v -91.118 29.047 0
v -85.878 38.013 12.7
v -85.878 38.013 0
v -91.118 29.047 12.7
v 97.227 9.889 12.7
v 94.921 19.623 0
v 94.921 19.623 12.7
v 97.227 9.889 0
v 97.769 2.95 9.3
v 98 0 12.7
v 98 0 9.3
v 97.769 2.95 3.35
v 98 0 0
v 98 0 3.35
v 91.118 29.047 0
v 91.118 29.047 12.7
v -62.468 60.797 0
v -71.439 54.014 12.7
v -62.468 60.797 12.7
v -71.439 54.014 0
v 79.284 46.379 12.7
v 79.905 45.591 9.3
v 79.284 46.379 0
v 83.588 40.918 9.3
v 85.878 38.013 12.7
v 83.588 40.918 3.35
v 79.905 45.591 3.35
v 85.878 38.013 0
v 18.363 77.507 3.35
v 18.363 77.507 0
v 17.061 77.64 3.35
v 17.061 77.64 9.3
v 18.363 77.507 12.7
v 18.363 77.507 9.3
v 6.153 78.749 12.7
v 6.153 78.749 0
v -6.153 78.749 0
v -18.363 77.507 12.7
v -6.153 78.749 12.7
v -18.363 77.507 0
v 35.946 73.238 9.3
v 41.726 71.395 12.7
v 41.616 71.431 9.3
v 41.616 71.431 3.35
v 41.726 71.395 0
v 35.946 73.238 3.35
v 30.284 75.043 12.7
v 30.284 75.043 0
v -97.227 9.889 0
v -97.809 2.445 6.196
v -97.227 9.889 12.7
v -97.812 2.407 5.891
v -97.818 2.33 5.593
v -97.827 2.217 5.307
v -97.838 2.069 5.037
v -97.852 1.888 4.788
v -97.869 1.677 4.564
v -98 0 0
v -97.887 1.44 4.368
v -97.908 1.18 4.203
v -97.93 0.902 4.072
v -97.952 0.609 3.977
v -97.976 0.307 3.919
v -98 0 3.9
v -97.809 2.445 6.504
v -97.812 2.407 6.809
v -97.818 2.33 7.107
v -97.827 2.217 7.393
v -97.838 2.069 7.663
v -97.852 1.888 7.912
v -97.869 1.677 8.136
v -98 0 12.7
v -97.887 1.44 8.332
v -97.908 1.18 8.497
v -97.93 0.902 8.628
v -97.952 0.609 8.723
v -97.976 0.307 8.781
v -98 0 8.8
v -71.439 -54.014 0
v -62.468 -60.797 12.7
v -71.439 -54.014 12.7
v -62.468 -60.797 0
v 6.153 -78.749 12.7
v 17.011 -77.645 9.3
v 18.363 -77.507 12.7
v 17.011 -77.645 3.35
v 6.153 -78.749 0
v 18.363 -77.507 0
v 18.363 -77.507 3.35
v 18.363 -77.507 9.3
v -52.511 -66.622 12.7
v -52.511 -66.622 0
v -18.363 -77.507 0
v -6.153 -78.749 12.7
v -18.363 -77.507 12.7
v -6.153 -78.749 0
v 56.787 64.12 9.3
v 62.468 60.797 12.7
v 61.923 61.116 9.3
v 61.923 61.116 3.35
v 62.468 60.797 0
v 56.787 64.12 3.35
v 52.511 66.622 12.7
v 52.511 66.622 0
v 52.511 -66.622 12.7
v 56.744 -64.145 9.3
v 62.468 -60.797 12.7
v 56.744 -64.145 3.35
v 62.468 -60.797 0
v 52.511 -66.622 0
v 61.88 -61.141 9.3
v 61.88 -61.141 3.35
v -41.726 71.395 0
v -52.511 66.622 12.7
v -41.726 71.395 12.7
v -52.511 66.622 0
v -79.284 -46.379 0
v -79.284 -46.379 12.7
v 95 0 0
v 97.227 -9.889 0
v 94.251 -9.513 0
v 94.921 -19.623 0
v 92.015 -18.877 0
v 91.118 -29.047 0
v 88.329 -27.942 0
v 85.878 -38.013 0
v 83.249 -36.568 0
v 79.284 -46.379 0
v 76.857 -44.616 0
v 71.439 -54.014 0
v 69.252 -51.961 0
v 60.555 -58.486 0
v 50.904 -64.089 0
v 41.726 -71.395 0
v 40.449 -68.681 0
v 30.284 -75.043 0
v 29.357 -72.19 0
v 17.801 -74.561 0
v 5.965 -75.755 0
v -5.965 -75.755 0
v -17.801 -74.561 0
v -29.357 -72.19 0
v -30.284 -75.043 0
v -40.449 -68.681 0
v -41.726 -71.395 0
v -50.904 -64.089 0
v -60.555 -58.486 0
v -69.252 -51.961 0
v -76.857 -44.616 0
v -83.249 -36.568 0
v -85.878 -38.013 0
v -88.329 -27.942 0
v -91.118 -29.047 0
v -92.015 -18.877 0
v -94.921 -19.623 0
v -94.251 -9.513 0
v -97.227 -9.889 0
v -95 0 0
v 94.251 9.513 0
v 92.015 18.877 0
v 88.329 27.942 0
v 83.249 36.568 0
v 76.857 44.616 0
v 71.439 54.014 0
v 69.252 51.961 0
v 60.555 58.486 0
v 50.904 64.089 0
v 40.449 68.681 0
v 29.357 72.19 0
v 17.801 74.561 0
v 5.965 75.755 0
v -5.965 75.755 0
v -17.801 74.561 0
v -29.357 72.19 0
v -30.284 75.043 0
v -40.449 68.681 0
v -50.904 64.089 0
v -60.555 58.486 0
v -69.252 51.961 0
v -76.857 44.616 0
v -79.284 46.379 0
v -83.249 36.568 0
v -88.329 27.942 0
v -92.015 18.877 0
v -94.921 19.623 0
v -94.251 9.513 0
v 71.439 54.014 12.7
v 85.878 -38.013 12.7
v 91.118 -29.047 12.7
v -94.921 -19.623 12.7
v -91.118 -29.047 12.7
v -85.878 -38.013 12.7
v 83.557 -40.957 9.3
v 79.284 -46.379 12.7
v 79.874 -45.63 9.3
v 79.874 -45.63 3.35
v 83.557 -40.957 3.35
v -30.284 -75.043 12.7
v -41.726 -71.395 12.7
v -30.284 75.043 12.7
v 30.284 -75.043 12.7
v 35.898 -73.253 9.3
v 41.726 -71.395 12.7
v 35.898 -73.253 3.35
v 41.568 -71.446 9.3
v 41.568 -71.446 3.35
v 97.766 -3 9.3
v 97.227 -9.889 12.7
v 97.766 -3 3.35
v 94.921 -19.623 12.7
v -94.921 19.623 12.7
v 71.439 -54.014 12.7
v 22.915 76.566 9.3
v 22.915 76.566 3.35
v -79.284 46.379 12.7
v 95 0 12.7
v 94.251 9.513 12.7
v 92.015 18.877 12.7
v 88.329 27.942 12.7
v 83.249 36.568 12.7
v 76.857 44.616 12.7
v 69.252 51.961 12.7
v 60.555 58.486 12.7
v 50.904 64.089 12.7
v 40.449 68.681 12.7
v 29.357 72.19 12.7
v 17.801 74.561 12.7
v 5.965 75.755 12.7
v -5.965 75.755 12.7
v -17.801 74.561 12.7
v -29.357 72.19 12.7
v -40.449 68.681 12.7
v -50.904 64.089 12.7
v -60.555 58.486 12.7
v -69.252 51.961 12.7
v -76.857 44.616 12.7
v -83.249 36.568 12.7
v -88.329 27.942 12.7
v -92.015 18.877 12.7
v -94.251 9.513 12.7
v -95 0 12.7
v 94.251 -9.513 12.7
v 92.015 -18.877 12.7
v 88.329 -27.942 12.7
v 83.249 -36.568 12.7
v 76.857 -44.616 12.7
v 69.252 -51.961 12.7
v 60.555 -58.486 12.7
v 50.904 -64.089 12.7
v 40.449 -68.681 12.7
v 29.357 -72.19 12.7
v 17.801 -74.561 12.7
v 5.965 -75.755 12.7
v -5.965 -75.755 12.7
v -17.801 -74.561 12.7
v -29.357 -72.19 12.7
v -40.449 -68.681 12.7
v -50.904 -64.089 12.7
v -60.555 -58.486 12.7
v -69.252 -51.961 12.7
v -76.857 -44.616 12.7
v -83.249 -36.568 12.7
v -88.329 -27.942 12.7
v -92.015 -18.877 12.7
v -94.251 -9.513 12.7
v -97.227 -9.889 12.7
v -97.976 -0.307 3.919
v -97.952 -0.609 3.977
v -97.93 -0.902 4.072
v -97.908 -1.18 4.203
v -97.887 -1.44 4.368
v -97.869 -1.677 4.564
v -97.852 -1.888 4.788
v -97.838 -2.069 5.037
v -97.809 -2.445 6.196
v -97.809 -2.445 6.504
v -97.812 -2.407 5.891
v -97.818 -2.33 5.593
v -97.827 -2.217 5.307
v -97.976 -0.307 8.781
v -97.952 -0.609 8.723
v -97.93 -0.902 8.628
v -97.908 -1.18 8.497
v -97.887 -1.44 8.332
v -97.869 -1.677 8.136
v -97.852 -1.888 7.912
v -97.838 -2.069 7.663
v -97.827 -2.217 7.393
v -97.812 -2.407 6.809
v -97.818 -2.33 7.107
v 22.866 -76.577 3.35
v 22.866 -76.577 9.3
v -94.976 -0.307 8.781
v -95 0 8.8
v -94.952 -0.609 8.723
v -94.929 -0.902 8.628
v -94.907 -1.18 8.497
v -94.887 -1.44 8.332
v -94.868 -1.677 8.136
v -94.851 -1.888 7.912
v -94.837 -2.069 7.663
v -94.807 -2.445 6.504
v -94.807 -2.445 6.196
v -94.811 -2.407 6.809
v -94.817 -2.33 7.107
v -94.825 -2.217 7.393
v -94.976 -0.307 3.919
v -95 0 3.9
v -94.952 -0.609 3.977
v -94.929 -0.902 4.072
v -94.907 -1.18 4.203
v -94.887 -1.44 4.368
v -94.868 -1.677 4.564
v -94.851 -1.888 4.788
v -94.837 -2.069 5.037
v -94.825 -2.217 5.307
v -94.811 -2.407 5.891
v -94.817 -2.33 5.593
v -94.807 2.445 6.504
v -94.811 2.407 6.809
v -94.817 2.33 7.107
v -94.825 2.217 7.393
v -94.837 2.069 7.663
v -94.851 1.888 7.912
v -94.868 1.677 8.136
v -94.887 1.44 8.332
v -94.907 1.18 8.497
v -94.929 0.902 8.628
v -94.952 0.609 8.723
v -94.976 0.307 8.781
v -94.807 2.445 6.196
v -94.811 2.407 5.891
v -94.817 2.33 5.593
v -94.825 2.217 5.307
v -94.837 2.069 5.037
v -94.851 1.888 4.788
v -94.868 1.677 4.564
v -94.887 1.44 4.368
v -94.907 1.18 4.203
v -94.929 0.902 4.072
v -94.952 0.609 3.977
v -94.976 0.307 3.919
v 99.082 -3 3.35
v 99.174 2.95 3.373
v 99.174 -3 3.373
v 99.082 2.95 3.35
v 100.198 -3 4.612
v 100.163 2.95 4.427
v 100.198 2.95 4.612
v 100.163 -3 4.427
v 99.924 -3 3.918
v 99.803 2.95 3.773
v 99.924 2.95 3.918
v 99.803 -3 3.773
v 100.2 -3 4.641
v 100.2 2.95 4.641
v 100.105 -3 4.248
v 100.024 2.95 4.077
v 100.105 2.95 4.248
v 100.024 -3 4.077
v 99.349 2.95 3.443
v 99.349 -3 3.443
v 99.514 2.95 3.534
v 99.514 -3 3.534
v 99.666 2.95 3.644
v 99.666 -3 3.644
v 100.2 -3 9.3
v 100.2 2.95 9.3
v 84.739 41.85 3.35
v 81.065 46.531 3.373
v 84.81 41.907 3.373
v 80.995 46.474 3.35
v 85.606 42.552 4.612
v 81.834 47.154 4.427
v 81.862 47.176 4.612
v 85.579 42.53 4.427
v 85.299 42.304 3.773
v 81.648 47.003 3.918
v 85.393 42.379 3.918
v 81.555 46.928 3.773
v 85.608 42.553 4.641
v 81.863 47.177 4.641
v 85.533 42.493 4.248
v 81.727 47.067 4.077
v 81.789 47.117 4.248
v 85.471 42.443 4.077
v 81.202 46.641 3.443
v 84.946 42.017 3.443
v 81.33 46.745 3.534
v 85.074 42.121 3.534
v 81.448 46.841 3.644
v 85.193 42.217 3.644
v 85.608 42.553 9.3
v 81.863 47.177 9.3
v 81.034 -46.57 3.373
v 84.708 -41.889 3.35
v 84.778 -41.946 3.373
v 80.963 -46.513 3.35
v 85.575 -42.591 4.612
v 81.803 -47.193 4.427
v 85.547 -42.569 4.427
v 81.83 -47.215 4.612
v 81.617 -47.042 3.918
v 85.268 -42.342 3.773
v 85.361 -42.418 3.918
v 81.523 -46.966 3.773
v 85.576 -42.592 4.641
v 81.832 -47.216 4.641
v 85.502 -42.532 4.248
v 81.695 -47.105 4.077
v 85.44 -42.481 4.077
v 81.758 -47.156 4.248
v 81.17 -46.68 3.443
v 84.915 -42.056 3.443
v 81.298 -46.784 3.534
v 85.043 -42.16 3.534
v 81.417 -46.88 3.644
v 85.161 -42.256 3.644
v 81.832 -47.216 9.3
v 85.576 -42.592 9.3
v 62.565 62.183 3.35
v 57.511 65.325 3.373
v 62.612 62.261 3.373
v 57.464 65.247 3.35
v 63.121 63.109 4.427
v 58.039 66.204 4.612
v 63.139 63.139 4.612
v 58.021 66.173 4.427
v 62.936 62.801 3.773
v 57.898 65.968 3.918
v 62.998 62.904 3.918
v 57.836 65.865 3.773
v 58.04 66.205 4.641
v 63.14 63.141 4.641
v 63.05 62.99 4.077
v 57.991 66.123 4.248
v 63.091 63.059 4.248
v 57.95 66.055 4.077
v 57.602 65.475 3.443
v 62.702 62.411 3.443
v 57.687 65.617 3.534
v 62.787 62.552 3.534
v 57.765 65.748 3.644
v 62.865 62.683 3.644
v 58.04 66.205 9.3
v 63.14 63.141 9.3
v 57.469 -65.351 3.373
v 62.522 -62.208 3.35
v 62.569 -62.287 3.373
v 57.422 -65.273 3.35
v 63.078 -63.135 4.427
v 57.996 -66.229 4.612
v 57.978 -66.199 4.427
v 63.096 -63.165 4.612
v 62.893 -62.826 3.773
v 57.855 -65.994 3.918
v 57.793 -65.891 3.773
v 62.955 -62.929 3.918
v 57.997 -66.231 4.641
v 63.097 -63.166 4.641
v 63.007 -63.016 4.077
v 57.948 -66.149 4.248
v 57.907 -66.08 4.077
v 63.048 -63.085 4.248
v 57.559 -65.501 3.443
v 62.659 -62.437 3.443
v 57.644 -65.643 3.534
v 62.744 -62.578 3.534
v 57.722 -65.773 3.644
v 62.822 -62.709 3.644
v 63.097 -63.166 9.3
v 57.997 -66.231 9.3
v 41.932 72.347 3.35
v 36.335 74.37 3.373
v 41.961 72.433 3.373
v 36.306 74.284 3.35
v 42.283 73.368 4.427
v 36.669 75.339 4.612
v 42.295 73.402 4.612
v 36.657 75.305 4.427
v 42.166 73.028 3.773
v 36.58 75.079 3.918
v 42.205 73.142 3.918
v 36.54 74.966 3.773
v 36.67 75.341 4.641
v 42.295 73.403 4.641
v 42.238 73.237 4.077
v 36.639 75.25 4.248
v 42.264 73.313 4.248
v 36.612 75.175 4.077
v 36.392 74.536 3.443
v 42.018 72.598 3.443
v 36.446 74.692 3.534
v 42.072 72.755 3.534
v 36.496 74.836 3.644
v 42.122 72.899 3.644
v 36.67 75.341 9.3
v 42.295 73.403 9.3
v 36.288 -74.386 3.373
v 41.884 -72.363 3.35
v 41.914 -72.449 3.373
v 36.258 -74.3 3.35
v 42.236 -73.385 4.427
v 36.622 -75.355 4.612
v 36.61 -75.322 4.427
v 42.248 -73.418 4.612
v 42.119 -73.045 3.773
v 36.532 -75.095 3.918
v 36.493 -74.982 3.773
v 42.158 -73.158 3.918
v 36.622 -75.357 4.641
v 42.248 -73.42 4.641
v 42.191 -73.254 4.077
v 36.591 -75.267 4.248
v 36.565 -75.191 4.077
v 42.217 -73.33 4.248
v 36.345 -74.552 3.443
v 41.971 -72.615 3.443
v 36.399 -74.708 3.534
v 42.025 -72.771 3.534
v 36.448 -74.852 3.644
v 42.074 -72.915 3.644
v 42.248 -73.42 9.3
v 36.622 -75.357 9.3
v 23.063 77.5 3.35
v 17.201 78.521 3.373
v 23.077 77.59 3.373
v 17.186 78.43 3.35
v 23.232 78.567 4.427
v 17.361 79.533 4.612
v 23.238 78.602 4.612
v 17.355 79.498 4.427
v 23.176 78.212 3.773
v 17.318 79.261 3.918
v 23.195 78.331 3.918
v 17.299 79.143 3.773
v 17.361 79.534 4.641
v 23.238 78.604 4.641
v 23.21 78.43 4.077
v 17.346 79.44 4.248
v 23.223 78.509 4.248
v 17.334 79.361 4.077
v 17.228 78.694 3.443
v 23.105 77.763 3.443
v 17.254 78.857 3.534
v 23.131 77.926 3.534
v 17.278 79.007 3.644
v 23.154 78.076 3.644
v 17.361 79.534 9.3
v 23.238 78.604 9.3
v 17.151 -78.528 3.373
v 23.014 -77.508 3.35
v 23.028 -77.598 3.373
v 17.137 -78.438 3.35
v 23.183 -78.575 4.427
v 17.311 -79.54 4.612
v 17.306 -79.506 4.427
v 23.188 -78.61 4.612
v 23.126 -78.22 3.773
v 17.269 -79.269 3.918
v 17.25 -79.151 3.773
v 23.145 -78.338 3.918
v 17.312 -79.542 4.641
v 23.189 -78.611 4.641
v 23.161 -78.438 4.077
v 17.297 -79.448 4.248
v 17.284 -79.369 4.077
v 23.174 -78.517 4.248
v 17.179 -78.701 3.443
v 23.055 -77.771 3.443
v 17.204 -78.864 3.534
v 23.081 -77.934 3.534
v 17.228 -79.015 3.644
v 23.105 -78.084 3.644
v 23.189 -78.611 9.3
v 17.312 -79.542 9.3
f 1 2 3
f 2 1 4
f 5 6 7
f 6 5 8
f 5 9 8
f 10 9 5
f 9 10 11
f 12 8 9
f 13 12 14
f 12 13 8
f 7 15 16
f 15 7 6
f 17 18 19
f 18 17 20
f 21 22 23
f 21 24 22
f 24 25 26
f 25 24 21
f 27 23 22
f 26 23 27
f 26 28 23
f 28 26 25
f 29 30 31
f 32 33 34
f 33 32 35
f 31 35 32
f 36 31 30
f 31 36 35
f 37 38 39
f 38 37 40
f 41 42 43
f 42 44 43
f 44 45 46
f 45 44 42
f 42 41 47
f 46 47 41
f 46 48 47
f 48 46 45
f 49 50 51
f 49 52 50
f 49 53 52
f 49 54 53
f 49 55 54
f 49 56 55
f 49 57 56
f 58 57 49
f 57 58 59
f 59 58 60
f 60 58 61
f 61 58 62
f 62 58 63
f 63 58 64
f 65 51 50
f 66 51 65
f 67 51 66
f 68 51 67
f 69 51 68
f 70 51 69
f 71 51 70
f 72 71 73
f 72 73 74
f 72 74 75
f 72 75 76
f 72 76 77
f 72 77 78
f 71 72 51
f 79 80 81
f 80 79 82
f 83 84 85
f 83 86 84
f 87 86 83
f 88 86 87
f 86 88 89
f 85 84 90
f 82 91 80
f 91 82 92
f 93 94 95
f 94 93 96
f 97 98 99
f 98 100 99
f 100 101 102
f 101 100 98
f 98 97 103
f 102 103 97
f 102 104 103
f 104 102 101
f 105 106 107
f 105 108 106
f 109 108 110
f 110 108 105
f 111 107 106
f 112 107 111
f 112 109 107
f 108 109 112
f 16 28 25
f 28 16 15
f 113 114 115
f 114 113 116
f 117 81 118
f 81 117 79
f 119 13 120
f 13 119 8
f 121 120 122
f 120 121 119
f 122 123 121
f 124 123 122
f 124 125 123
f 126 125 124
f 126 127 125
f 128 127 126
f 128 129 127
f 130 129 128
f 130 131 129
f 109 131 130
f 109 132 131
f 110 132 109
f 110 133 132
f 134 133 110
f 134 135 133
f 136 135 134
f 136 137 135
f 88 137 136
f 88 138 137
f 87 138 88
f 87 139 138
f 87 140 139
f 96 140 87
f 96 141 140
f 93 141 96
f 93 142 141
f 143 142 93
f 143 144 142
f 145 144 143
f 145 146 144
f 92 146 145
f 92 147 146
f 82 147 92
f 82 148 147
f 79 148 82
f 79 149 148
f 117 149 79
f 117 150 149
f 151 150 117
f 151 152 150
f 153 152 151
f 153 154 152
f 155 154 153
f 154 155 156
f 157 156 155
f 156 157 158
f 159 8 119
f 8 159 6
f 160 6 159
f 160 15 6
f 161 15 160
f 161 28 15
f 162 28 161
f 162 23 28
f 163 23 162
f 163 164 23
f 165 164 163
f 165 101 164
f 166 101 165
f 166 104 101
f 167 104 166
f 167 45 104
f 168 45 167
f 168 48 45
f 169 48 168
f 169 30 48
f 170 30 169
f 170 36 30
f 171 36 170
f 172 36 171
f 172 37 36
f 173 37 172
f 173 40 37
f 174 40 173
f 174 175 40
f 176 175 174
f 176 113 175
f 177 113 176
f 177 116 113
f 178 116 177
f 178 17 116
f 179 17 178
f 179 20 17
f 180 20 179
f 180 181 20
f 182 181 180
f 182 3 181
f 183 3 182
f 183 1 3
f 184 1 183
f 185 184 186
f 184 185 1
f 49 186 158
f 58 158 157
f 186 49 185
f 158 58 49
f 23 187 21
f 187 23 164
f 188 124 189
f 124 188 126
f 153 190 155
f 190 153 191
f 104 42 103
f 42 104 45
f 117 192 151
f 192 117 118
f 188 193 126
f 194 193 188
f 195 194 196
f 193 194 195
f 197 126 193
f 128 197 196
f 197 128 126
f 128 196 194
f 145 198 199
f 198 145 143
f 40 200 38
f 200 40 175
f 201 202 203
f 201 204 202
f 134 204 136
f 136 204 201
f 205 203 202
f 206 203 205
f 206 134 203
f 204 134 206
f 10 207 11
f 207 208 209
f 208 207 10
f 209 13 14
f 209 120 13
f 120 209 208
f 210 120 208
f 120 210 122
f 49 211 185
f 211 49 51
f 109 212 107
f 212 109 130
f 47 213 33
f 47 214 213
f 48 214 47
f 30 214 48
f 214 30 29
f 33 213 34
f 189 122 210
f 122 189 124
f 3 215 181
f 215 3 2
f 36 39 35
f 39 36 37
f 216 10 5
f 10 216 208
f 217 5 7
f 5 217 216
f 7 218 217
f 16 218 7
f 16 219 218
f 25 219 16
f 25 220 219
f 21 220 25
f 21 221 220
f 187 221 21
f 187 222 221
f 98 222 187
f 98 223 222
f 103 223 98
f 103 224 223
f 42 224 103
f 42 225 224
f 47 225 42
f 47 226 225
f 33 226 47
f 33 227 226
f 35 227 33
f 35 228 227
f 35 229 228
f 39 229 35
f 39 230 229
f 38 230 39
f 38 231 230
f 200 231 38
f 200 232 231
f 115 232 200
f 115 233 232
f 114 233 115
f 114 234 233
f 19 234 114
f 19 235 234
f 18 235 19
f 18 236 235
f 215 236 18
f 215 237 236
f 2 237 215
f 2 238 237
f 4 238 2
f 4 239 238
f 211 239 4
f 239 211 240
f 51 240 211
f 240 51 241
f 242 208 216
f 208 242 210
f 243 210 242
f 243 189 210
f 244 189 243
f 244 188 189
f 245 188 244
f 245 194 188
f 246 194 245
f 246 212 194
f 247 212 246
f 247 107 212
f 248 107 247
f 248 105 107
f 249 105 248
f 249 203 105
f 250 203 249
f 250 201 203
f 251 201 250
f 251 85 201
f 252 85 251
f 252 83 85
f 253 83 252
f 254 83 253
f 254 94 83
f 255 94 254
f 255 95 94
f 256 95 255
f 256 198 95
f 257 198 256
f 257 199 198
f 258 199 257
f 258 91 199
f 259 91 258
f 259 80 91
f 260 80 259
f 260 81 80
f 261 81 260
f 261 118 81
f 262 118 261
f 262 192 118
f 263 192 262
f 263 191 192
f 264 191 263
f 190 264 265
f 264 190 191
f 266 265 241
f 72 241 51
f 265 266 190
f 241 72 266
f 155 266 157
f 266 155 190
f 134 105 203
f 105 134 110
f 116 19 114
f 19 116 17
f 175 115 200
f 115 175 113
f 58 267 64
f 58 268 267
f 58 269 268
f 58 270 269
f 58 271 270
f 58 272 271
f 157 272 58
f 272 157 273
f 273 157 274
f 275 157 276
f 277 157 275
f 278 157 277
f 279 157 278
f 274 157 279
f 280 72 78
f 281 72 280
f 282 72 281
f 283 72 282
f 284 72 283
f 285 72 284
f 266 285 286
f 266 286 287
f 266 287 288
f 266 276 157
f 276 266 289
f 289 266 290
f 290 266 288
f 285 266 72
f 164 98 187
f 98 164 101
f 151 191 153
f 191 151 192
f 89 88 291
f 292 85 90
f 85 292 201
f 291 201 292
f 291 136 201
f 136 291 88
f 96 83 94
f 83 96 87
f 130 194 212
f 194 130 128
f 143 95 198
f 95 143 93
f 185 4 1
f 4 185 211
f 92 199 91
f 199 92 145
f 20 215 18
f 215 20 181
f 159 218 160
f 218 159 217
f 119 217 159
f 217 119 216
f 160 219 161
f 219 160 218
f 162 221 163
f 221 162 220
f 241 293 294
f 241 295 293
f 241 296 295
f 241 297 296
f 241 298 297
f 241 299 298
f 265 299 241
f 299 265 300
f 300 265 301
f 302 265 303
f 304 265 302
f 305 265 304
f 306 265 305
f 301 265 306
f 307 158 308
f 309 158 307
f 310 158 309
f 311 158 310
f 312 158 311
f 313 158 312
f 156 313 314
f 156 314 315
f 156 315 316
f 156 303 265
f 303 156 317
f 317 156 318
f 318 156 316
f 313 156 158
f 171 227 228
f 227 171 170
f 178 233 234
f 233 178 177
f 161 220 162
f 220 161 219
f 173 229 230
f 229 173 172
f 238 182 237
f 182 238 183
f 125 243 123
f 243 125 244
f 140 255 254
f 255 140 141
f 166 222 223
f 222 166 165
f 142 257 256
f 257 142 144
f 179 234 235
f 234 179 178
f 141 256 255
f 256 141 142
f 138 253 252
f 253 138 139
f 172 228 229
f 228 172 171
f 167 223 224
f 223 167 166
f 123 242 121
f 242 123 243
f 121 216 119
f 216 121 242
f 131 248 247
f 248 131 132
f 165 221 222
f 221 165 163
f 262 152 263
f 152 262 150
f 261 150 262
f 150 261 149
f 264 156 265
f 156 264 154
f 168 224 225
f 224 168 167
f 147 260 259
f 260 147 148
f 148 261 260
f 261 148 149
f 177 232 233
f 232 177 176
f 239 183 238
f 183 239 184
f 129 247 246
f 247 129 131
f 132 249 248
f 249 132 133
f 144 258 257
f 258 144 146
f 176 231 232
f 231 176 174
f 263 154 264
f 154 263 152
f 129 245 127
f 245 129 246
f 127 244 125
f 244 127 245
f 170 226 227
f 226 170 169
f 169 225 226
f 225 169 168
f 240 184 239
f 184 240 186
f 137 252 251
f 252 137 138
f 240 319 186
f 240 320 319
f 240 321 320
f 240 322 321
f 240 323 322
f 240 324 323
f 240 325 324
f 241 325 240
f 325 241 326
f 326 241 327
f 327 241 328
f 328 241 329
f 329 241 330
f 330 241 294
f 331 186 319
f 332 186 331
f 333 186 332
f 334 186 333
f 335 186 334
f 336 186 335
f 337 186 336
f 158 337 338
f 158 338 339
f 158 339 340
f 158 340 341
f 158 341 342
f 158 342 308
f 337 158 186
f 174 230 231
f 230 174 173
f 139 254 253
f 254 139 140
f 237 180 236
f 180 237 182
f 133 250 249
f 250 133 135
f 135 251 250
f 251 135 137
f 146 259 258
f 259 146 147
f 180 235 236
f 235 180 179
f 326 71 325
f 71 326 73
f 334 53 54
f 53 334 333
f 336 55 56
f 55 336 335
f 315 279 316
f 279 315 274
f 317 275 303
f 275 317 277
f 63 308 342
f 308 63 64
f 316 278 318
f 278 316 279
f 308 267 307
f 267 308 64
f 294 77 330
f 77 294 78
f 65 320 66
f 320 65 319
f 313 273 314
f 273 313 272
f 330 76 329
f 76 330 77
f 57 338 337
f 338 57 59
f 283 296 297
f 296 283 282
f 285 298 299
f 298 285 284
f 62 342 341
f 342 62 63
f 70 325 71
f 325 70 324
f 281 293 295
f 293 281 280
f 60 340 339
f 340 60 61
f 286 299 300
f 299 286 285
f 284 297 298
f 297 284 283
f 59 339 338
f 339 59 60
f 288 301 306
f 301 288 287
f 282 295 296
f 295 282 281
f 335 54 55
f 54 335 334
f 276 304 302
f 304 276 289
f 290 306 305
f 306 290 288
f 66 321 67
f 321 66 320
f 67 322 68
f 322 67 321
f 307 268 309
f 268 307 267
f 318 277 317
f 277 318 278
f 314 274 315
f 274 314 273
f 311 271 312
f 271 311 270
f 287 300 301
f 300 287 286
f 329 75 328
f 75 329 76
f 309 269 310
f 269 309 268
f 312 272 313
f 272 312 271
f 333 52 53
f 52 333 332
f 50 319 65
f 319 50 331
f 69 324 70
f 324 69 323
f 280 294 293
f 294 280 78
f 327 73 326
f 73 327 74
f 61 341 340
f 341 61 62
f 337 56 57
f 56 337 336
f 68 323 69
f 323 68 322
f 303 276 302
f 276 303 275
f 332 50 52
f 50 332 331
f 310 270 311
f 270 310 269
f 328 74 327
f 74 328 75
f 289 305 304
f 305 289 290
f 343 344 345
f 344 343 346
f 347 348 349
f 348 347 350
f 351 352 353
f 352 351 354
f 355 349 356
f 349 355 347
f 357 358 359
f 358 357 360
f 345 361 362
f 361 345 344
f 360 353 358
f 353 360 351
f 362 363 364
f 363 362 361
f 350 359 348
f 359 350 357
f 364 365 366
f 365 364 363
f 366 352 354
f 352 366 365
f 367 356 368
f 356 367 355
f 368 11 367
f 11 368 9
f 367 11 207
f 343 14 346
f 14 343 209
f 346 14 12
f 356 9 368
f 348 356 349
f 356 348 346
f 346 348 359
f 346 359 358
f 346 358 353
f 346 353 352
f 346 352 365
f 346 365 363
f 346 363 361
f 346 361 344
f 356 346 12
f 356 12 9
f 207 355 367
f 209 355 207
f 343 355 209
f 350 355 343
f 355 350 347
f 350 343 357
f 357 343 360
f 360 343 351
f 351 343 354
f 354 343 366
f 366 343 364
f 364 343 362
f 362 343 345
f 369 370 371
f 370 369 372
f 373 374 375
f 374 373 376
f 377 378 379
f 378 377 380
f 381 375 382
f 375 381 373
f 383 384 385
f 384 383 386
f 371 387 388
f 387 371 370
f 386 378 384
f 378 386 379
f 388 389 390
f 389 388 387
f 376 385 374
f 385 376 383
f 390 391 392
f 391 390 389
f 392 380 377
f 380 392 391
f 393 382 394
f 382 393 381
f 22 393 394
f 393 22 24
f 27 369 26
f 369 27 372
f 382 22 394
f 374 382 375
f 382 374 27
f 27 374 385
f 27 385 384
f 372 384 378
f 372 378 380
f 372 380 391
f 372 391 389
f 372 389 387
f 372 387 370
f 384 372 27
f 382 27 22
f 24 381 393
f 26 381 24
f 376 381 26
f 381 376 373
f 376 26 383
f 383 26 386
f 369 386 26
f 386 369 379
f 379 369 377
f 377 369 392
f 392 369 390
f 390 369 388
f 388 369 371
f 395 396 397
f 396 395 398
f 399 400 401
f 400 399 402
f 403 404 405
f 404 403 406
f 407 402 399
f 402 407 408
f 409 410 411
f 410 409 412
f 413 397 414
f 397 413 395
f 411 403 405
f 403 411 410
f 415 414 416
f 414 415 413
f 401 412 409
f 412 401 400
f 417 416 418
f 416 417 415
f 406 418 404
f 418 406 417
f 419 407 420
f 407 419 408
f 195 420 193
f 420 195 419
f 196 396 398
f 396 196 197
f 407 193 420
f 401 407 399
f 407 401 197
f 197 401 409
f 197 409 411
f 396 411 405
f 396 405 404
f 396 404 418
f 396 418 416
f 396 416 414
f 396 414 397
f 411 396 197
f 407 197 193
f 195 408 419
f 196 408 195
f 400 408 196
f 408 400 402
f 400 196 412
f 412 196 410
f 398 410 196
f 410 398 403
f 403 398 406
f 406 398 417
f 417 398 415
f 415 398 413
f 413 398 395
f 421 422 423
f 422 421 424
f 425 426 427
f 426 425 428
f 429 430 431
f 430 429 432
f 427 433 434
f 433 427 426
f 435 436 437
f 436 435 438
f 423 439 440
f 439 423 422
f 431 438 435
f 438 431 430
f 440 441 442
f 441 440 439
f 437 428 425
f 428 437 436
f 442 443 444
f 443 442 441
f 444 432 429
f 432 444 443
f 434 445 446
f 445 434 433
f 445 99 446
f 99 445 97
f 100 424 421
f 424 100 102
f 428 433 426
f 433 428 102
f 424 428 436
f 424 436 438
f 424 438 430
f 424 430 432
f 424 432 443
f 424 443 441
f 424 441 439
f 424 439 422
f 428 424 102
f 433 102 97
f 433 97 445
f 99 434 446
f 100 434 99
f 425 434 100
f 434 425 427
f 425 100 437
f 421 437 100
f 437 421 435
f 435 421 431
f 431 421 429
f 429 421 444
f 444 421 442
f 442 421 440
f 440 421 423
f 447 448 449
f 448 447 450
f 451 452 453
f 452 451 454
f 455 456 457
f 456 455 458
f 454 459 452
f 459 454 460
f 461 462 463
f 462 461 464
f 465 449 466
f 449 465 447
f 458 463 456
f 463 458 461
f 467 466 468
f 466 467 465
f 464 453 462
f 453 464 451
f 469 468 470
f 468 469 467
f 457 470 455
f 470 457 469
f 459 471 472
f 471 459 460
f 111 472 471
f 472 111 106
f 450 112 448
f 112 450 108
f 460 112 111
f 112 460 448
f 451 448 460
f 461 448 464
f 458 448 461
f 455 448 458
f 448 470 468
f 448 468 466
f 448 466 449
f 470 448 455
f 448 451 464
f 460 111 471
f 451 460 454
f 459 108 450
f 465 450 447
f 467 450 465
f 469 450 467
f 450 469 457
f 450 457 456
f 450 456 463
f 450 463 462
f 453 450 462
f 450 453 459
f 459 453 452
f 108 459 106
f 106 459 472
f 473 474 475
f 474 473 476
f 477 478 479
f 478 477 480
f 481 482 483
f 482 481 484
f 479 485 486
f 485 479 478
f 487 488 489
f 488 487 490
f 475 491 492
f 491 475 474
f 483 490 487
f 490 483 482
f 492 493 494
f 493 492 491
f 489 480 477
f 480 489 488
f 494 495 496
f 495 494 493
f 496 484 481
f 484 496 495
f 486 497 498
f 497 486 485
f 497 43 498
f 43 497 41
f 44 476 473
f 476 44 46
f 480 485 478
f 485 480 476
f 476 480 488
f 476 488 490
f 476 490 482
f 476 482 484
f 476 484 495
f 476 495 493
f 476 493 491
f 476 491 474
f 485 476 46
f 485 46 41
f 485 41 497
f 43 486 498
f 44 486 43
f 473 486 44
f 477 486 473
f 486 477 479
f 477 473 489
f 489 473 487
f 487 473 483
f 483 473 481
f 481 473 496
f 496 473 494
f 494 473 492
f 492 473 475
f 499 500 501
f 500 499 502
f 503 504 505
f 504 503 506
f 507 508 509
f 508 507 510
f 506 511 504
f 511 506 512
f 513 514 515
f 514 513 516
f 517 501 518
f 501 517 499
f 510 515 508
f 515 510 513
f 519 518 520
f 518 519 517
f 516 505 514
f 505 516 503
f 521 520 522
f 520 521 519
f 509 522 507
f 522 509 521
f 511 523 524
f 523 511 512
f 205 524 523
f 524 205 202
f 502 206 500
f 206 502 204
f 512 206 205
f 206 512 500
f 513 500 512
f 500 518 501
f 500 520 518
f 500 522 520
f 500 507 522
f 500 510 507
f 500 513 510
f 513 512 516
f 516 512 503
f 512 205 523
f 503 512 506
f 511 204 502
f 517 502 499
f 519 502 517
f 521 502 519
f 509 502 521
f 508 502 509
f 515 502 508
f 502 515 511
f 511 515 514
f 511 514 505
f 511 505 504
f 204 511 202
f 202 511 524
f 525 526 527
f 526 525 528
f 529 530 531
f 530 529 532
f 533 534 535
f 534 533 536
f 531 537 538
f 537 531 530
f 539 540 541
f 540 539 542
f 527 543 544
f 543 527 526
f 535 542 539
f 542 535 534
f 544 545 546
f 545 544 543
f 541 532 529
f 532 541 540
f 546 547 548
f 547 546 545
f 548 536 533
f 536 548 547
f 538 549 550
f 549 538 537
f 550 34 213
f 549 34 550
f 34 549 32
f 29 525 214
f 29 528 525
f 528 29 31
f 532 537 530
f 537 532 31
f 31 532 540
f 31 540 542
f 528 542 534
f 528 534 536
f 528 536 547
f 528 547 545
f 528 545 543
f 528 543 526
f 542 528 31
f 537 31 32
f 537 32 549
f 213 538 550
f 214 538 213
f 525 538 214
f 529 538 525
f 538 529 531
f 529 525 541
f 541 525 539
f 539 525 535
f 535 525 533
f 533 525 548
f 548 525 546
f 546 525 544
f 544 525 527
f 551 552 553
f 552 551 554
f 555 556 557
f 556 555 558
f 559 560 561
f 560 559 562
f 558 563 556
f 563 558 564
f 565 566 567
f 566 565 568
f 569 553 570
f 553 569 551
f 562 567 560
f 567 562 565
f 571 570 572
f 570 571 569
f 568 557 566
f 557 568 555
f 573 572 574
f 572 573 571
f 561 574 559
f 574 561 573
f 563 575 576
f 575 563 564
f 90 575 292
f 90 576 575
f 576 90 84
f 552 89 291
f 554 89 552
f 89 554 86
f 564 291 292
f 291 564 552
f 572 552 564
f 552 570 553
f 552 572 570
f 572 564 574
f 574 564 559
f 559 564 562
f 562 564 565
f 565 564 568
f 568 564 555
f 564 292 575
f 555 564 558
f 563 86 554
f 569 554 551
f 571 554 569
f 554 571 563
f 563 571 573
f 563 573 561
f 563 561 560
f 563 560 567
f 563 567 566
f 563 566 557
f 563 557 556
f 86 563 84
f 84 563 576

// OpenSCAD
$fn=50;

BaseWidth=152*1;
BaseLength=190*1;
BandHeight_mm=12.7*1;
BandThickness_mm=3*1;

//Measure your head in mm with a sewing tape measure
HeadCircumference_mm = 540; //[450:750]


CircPercent = HeadCircumference_mm/540;
CalcLength = BaseLength*CircPercent/2;
CalcWidth = CalcLength*0.799;
echo(CalcLength);
echo(CalcWidth);

//Define an Oval (shape of band)
module oval(w,h, height, center = false) {
 scale([1, h/w, 1]) cylinder(h=height, r=w, center=center); 
};
//Create the Band, with hole in back for rear ornament
difference() {
    difference() {oval (CalcLength+BandThickness_mm,CalcWidth+BandThickness_mm,BandHeight_mm,center=false,center=false);
translate ([0,0,-1]) oval (CalcLength,CalcWidth,BandHeight_mm+2,center=false);};
translate([(CalcLength+20)*-1,0,BandHeight_mm/2]) rotate([0,90,0]) cylinder(40,r=2.45,center=false);}

//Define the Mounting Bracket
module CubeMount(width, height, center=false){
    difference() {translate([-2.25,-3,BandHeight_mm/2-3]) cube([4.45,5.95,5.95]); difference() {translate([0.71,3,BandHeight_mm/2-3.05]) rotate([90,0,0]) cube([1.5,1.5,6.1]);
    translate([0.71,3,BandHeight_mm/2-3+1.45]) rotate([90,0,0]) cylinder(h=8,r=1.5,center=center);}}
};
//Front Mount for centerpiece
translate([CalcLength+BandThickness_mm,0,0]) CubeMount();
//Mounts for XL Leaves
translate([84/101*CalcLength+BandThickness_mm,43.5*CircPercent,0]) rotate([0,0,39]) CubeMount();
translate([84/101*CalcLength+BandThickness_mm,-43.5*CircPercent,0]) rotate([0,0,-39]) CubeMount();
//Mounts for L Leaves
translate([60/101*CalcLength+BandThickness_mm,62.8*CircPercent,0]) rotate([0,0,59]) CubeMount();
translate([60/101*CalcLength+BandThickness_mm,-62.8*CircPercent,0]) rotate([0,0,-59]) CubeMount();
//Mounts for M Leaves
translate([38/101*CalcLength+BandThickness_mm,72.3*CircPercent,0]) rotate([0,0,71]) CubeMount();
translate([38/101*CalcLength+BandThickness_mm,-72.3*CircPercent,0]) rotate([0,0,-71]) CubeMount();
//Mounts for S Leaves
translate([18/101*CalcLength+BandThickness_mm,76.9*CircPercent,0]) rotate([0,0,81]) CubeMount();
translate([18/101*CalcLength+BandThickness_mm,-76.9*CircPercent,0]) rotate([0,0,-81]) CubeMount();
